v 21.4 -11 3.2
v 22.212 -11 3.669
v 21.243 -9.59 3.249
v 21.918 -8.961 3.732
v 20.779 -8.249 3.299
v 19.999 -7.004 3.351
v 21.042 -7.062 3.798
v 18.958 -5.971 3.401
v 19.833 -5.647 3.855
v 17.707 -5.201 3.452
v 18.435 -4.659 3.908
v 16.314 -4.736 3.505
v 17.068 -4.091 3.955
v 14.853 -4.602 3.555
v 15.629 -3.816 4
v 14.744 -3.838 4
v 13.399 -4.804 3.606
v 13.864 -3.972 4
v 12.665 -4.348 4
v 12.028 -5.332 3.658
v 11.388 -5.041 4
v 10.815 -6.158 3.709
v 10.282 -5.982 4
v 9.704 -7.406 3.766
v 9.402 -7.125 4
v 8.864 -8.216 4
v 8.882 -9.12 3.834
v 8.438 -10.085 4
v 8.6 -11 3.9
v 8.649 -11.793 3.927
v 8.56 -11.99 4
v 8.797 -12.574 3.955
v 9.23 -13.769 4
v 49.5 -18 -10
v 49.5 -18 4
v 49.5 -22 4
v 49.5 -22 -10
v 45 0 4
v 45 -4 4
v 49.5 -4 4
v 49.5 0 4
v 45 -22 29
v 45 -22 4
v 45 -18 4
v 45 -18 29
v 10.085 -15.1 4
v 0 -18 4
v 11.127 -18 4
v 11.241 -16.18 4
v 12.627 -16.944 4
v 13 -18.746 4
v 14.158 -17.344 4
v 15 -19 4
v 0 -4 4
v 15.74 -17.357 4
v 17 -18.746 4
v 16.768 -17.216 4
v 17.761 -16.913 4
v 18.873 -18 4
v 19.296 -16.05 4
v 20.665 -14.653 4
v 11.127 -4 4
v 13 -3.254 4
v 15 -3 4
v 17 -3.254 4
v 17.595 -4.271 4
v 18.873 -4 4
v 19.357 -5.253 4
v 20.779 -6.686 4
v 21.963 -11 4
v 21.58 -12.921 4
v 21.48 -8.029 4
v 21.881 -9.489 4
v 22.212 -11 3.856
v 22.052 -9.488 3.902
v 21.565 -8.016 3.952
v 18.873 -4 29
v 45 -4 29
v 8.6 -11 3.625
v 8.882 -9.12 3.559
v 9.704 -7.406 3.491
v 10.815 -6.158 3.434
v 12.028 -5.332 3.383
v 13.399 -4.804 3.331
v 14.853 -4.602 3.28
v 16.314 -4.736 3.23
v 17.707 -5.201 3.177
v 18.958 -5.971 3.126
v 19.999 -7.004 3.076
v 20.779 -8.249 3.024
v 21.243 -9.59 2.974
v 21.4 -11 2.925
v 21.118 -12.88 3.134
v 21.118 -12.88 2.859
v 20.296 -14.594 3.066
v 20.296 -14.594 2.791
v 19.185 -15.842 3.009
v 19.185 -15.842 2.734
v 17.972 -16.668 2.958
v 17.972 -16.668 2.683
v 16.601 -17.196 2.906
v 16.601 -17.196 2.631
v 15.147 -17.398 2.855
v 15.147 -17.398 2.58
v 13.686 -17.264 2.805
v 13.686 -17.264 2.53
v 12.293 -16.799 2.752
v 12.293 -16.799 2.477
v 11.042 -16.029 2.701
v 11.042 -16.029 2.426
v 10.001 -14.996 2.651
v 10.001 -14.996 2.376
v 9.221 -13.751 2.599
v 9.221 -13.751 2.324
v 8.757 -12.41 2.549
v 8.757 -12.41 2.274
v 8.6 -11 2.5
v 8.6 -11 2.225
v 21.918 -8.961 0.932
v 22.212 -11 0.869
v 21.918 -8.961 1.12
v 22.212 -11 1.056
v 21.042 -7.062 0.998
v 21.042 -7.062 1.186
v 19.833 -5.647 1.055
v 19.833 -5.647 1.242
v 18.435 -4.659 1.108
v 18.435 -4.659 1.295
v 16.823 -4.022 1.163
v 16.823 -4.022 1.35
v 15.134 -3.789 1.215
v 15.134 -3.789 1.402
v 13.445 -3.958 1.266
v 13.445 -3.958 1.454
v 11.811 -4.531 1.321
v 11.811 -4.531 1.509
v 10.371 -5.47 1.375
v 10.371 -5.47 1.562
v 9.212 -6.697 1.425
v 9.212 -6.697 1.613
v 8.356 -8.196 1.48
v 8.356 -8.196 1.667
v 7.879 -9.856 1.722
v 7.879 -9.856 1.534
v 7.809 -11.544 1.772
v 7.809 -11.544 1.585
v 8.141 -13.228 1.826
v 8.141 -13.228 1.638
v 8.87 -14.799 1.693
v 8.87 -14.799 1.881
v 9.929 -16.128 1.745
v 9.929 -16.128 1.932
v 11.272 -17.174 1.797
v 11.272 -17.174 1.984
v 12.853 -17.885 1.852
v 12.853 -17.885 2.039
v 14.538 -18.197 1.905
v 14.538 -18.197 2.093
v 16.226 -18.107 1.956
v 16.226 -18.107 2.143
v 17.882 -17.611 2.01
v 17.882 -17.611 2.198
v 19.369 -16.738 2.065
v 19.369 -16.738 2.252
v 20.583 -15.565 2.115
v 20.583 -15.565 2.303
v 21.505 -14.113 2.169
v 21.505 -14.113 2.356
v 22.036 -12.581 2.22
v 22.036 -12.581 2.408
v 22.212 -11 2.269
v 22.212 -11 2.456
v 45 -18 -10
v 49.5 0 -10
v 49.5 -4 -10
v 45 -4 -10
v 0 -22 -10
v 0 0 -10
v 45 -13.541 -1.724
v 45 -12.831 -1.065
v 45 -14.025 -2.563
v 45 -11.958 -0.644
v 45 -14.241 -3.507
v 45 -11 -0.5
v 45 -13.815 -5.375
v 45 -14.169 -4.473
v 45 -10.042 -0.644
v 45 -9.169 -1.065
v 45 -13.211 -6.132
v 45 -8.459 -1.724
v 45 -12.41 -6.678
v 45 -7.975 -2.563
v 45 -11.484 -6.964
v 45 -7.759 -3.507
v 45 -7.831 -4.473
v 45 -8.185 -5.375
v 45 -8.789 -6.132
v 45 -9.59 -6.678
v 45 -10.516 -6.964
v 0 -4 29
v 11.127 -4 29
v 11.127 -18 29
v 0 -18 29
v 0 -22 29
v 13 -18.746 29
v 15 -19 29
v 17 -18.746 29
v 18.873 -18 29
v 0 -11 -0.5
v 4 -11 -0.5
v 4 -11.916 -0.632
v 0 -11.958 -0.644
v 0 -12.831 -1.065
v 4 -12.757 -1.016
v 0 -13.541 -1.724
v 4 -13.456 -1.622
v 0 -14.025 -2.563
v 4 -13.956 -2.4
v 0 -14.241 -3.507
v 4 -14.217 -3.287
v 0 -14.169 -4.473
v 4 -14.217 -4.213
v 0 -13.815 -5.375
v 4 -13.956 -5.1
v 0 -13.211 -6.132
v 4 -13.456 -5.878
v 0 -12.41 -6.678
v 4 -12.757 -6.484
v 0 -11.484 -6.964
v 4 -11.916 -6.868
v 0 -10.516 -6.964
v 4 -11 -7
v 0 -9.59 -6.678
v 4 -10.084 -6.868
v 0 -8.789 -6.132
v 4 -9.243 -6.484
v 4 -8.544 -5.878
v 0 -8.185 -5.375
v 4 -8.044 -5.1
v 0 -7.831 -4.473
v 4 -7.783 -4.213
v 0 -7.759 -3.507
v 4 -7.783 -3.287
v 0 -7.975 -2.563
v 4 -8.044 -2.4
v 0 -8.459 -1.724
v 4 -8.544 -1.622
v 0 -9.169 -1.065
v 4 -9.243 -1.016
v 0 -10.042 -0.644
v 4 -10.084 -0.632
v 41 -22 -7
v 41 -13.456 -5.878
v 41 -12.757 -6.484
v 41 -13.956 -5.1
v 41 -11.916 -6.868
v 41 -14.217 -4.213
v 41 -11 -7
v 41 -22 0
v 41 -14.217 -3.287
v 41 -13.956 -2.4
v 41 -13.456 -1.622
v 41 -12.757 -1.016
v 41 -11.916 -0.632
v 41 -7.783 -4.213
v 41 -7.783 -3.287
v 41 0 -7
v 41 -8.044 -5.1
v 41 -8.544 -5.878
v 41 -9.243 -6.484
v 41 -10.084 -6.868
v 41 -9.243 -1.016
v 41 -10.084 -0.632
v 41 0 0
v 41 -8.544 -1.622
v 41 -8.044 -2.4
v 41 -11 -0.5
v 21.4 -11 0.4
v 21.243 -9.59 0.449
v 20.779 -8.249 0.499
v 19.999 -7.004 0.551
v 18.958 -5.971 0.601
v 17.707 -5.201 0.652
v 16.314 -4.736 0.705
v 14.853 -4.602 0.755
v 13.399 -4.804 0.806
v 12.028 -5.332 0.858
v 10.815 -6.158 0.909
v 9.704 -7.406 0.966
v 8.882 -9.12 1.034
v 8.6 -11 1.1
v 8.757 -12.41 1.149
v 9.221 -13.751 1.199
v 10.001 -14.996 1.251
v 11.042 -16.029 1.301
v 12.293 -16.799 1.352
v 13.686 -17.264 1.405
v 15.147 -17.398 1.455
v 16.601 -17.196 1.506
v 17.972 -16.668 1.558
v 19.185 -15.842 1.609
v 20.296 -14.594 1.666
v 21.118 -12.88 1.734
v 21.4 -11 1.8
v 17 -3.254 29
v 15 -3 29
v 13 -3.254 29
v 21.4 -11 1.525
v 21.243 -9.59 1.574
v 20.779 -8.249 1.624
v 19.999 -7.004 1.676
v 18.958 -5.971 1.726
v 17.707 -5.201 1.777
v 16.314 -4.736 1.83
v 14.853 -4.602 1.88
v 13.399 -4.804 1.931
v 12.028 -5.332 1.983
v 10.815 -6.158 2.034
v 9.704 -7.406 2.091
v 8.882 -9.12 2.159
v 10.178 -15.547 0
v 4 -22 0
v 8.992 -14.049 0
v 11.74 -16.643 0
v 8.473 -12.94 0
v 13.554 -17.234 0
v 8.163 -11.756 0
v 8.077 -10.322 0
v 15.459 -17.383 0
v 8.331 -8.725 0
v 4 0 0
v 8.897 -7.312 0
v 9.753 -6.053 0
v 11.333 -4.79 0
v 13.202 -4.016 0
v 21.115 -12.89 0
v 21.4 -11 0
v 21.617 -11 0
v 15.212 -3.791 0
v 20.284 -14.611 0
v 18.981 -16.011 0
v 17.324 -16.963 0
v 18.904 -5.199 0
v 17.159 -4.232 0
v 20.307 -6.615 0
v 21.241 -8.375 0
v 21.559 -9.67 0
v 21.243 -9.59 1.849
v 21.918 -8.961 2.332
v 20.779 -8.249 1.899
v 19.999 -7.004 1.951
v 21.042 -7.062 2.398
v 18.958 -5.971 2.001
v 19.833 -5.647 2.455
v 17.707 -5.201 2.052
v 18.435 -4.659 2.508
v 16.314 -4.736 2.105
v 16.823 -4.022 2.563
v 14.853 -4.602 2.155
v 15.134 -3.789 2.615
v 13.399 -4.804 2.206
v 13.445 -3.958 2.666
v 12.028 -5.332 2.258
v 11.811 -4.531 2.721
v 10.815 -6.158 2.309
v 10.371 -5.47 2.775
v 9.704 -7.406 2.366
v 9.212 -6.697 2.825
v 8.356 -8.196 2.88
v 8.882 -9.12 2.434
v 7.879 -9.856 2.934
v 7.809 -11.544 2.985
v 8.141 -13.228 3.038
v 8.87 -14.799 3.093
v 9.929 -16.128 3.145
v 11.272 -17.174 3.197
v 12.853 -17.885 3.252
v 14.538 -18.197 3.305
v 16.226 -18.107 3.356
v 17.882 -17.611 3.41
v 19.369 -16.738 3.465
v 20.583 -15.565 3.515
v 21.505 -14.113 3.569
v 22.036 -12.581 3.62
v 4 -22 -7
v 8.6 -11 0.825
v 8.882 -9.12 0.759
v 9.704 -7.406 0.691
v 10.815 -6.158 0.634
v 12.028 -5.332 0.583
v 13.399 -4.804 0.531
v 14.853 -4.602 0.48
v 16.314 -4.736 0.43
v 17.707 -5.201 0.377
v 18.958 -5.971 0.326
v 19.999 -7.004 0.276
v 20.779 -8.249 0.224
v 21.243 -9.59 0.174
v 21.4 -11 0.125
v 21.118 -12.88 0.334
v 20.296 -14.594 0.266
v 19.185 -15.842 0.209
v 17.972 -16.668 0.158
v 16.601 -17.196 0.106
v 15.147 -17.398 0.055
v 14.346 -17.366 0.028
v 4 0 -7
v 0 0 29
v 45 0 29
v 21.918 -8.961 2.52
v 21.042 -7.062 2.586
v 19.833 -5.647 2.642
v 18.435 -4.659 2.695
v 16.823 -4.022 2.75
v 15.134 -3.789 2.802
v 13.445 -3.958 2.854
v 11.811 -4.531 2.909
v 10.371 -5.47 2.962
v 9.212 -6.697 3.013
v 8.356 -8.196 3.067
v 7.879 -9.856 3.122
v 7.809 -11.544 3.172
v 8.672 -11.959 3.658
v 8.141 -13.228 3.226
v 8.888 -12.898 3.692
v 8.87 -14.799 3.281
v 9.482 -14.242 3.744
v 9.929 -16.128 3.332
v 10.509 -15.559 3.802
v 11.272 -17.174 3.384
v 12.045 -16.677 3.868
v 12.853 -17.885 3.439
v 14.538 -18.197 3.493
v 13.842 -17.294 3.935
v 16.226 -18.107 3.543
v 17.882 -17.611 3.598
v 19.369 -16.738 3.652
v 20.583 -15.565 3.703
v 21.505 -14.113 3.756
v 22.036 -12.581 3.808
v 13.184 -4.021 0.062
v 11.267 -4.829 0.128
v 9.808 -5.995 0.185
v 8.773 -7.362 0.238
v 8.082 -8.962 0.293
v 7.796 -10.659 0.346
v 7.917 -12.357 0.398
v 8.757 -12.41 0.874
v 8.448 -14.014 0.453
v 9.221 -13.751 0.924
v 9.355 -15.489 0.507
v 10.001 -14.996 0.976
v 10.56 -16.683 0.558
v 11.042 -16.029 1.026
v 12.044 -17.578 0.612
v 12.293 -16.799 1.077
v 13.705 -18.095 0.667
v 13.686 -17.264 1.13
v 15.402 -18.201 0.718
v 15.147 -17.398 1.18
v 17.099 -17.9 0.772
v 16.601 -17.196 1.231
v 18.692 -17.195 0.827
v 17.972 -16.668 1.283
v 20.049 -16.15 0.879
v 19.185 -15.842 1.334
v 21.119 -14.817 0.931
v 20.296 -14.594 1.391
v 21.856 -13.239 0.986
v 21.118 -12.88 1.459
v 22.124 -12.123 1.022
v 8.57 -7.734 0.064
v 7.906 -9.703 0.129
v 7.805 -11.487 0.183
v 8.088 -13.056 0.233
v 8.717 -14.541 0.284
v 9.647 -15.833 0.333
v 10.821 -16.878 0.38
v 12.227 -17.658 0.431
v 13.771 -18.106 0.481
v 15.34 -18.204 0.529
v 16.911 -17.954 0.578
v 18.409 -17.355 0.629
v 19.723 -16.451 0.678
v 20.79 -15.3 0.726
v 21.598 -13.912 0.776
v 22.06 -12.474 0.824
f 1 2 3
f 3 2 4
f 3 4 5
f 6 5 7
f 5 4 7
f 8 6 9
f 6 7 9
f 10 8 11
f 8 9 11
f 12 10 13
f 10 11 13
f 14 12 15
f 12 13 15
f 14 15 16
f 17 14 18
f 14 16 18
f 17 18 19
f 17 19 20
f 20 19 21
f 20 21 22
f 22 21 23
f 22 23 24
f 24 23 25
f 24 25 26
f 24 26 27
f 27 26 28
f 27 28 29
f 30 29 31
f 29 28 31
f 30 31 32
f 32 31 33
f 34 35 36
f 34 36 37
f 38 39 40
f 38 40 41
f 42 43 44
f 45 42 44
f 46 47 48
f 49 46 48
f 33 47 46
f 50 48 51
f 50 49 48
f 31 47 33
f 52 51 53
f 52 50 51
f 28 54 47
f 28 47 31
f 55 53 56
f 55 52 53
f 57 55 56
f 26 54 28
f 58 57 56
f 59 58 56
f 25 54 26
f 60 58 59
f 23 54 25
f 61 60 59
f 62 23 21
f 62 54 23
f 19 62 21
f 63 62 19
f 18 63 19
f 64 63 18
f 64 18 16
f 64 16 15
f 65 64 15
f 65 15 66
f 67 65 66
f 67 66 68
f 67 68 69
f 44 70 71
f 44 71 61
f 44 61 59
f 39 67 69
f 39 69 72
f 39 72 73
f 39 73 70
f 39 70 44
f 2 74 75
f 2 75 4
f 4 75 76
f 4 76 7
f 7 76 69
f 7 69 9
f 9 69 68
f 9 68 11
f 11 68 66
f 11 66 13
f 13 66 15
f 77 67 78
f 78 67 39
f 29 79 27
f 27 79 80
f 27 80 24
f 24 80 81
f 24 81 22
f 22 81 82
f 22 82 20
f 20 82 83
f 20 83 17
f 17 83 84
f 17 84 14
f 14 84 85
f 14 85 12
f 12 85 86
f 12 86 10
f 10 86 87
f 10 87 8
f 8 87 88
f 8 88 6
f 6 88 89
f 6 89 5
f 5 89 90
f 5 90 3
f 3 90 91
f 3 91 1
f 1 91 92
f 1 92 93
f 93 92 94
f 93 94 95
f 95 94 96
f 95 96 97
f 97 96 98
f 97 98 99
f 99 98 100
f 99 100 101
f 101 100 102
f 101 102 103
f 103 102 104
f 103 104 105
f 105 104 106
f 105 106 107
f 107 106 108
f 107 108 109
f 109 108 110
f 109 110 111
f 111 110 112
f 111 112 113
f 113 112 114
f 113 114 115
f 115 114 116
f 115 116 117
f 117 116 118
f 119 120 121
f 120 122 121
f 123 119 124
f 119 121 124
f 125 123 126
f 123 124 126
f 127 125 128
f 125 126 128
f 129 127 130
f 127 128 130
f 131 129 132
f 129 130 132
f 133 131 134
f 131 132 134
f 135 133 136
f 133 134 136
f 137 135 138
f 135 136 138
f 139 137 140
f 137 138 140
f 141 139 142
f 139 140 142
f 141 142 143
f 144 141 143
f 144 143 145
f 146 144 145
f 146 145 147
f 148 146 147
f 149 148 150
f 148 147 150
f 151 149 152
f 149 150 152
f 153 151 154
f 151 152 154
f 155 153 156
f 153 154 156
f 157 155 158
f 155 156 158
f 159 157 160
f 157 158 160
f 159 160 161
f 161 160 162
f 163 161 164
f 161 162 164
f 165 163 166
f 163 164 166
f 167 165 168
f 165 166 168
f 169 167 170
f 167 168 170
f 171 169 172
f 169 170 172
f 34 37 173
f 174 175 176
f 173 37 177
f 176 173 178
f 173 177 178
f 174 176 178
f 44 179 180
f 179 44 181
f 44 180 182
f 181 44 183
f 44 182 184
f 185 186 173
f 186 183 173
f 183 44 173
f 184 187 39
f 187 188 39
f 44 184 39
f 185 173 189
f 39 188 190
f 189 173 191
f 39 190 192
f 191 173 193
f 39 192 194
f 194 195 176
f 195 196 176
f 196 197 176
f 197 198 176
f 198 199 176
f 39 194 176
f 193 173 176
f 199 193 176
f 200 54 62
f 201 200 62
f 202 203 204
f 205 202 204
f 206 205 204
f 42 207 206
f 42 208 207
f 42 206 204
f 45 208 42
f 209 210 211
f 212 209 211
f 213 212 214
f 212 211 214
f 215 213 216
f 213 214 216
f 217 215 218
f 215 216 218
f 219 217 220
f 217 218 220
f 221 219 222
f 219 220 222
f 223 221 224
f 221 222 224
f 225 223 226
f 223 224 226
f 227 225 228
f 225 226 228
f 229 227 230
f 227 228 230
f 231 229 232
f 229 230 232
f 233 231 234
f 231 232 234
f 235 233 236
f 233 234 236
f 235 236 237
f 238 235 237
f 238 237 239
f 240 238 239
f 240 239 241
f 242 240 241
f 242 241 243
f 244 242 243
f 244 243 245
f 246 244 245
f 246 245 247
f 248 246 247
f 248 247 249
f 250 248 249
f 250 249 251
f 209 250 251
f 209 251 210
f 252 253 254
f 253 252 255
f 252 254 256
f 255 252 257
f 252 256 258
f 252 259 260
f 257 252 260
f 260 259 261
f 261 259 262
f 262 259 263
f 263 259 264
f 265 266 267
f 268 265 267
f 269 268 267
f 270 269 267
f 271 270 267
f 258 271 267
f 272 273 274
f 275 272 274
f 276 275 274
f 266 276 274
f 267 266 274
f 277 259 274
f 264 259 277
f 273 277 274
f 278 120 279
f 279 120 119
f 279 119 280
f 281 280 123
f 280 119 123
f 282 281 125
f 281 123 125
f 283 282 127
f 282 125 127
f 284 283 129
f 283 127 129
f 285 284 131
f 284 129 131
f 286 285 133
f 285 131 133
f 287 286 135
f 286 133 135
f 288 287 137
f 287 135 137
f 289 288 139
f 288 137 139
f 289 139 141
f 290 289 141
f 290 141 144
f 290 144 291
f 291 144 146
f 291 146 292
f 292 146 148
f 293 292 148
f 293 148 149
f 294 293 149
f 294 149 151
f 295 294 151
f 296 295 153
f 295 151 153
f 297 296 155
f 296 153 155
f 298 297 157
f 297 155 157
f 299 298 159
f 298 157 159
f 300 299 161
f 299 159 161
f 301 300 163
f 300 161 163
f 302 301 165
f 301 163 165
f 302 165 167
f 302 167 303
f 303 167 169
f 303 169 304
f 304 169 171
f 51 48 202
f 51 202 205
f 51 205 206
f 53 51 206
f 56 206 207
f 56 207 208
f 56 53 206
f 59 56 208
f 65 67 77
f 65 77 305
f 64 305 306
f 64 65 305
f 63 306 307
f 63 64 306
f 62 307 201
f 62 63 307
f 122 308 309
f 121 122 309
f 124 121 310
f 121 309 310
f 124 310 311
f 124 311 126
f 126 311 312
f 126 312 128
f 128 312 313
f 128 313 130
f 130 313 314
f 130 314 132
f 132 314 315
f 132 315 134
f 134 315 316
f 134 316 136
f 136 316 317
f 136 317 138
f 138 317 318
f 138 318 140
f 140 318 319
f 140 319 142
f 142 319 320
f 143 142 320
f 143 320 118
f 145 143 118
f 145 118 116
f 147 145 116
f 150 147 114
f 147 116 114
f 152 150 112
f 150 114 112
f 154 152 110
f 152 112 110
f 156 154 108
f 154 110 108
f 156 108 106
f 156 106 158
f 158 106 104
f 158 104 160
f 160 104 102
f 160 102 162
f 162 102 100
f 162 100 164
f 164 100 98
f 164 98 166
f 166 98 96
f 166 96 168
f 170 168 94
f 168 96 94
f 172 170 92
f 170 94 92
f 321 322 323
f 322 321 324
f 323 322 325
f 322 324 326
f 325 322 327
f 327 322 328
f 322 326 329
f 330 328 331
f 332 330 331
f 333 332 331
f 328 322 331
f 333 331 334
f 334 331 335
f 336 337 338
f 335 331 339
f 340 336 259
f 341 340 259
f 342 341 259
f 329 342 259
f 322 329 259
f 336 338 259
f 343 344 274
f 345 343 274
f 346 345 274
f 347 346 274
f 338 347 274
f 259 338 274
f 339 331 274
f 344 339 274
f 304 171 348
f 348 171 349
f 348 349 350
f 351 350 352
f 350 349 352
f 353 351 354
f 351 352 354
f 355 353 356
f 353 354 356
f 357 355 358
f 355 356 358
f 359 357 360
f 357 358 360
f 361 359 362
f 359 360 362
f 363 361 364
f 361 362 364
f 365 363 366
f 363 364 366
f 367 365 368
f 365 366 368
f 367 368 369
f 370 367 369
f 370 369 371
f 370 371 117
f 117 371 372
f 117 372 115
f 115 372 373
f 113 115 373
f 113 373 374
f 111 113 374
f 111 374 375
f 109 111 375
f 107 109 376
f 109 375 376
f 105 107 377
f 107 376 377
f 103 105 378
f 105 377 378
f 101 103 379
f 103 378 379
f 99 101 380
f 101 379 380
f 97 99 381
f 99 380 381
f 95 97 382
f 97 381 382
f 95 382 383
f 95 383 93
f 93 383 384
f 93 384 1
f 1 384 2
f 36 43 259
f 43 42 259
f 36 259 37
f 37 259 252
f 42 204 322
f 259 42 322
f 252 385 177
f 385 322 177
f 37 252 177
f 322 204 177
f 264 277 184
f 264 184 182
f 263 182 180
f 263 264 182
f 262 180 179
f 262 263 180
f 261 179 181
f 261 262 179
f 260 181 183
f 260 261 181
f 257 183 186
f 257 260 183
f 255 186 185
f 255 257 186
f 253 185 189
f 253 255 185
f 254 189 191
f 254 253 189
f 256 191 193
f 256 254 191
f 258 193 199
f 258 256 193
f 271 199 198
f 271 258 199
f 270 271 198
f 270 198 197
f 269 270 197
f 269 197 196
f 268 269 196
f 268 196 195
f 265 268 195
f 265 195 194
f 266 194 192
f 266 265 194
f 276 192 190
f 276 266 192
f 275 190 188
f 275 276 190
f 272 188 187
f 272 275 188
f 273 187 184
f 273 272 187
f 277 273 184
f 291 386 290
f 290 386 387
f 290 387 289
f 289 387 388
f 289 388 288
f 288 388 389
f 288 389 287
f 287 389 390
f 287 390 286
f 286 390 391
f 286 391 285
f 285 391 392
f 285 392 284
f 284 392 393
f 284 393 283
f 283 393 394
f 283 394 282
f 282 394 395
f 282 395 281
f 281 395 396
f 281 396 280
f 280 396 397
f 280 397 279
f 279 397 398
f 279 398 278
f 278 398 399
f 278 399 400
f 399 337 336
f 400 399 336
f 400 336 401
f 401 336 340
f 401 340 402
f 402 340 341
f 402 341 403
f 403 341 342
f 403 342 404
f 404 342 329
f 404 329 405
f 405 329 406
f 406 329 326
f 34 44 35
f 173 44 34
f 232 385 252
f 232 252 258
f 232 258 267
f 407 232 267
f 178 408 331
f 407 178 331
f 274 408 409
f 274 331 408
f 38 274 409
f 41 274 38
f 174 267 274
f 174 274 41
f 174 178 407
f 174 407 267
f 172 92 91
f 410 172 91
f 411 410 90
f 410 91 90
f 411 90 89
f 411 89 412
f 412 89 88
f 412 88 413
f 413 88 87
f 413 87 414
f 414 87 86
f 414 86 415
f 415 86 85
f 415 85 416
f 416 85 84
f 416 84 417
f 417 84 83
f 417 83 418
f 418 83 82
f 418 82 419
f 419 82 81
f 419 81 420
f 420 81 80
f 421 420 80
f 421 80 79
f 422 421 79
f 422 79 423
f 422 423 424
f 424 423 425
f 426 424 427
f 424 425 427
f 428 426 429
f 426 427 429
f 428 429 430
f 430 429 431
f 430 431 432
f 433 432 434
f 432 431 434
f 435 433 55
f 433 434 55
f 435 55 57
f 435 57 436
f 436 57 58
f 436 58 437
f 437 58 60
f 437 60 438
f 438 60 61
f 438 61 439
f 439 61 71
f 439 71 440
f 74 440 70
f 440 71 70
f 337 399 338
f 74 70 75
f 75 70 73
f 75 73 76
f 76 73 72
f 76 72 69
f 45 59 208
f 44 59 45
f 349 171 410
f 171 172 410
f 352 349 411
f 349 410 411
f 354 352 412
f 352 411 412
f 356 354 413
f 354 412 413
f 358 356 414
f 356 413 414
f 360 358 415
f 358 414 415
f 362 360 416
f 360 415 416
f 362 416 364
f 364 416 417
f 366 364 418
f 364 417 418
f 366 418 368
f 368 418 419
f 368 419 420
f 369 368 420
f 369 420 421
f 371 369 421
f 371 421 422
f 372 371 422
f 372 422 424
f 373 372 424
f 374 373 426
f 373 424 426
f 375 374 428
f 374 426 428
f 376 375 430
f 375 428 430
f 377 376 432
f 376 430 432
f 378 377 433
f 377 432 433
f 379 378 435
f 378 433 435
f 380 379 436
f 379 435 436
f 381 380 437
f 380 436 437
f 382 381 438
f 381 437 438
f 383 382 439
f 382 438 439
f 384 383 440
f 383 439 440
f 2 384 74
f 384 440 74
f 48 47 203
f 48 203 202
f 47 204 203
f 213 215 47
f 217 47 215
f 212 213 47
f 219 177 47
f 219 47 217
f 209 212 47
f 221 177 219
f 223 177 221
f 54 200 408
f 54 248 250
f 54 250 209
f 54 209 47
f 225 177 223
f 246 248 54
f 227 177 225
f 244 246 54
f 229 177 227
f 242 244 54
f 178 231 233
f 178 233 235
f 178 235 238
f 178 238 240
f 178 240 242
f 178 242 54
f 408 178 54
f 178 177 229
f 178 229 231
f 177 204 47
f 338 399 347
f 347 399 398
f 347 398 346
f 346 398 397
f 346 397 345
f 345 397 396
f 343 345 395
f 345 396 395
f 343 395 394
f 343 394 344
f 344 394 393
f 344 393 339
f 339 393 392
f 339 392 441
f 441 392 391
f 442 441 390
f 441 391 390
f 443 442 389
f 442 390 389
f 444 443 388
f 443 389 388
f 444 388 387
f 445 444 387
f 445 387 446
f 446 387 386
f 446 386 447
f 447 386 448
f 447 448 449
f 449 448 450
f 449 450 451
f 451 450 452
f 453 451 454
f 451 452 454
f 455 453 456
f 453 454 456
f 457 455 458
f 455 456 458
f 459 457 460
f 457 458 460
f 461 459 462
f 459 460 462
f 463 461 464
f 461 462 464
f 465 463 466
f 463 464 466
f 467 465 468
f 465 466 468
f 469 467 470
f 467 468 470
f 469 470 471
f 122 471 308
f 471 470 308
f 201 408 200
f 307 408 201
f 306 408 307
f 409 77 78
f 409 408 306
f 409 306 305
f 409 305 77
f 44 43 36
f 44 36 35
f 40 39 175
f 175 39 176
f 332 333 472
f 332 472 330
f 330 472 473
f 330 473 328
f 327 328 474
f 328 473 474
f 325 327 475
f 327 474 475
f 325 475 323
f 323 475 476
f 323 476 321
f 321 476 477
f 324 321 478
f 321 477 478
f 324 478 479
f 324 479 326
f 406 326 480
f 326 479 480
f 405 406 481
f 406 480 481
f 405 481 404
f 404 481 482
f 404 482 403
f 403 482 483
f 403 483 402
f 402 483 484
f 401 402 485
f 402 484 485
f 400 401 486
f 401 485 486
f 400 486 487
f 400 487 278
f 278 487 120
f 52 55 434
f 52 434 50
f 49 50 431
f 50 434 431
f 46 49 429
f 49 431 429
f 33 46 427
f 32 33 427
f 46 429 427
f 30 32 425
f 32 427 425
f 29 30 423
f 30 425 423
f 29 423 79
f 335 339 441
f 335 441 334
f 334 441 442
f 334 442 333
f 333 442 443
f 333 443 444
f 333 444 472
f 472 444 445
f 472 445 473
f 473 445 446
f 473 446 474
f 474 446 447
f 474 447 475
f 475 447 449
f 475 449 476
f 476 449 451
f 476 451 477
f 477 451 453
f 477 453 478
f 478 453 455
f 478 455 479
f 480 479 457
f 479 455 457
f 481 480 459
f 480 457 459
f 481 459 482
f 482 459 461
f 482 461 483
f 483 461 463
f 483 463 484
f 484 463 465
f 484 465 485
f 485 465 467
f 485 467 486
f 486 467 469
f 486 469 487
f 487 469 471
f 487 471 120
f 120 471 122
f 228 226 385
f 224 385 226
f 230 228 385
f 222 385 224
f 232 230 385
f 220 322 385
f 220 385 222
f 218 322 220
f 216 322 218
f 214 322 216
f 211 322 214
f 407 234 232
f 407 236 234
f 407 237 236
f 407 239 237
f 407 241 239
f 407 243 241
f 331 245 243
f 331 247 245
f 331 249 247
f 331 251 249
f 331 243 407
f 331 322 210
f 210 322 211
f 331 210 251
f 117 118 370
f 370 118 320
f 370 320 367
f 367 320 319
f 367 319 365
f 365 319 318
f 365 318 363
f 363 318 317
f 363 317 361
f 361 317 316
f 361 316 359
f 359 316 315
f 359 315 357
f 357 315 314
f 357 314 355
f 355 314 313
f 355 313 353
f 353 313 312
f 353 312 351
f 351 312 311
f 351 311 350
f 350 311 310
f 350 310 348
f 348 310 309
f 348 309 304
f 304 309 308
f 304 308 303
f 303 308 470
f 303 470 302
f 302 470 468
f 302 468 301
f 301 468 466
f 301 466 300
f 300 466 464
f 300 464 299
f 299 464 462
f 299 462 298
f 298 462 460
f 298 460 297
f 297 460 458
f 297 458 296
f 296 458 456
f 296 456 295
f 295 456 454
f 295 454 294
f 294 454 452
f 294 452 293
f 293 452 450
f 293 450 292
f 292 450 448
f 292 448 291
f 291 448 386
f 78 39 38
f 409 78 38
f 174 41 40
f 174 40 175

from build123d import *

# Parameters (mm, degrees)
ESQUISSE1_W                         = 45
ESQUISSE1_H                         = 22
BOSS_EXTRU_1_DEPTH                  = 4
ESQUISSE2_R                         = 6.4
ENL_V_MAT_EXTRU_1_DEPTH             = 4
FILETAGE1_PITCH                     = 1.4
ESQUISSE3_W                         = 4
ESQUISSE3_H                         = 22
BOSS_EXTRU_2_DEPTH                  = 10
ESQUISSE4_W                         = 3
ESQUISSE4_H                         = 22
BOSS_EXTRU_3_DEPTH                  = 37
ENL_V_MAT_EXTRU_2_REACH             = 49.592
ESQUISSE5_R                         = 3.25
ENL_V_MAT_EXTRU_2_DIRECTION_2_REACH = 49.592
ESQUISSE6_W                         = 45
ESQUISSE6_H                         = 4
BOSS_EXTRU_4_DEPTH                  = 25
ESQUISSE7_R                         = 8
ENL_V_MAT_EXTRU_4_DEPTH             = 25
ESQUISSE8_W                         = 14
ESQUISSE8_H                         = 4
BOSS_EXTRU_5_DEPTH                  = 4.5


with BuildPart() as part:
    # Esquisse1 → Boss.-Extru.1 (new body)
    with BuildSketch(Plane.XY):
        with Locations((22.5, -11)):
            Rectangle(ESQUISSE1_W, ESQUISSE1_H)
    extrude(amount=BOSS_EXTRU_1_DEPTH)

    # Esquisse2 → Enlèv. mat.-Extru.1 (cut)
    with BuildSketch(Plane(origin=(0, 0, 0), x_dir=(-1, 0, 0), z_dir=(0, 0, -1))):
        with Locations((-15, -11)):
            Circle(ESQUISSE2_R)
    extrude(amount=-ENL_V_MAT_EXTRU_1_DEPTH, mode=Mode.SUBTRACT)

    # Filetage1: the profile of Profil de filetage1 profile screwed along a right-hand helix of 4 turns, 8 arcs to a turn; built about Z, then put on its axis
    filetage1_z = Axis((0, 0, 0), (0, 0, 1))
    filetage1_corners = [(6.3997, 0, -0.000173205), (7.211898812, 0, 0.468749998), (7.211898812, 0, 0.656249998), (6.3997, 0, 1.125173201)]
    with BuildLine(mode=Mode.PRIVATE) as filetage1_profile:
        Line(filetage1_corners[0], filetage1_corners[1])
        Line(filetage1_corners[1], filetage1_corners[2])
        Line(filetage1_corners[2], filetage1_corners[3])
        Line(filetage1_corners[3], filetage1_corners[0])
    filetage1_cap = Face(filetage1_profile.wire())
    filetage1_turn_angles = [0, 22.5, 45, 67.5, 90, 112.5, 135, 157.5, 180, 202.5, 225, 247.5, 270, 292.5, 315, 337.5, 360]
    filetage1_turn_weights = [1, 0.9238795325112867, 1, 0.9238795325112867, 1, 0.9238795325112867, 1, 0.9238795325112867, 1, 0.9238795325112867, 1, 0.9238795325112867, 1, 0.9238795325112867, 1, 0.9238795325112867, 1]
    filetage1_turn_rails = [Edge.make_bspline([Vector(p[0], p[1], 0).rotate(filetage1_z, filetage1_turn_angles[k]) / filetage1_turn_weights[k] + Vector(0, 0, p[2] + FILETAGE1_PITCH * filetage1_turn_angles[k] / 360) for k in range(17)], [0, 0, 0, 1, 1, 2, 2, 3, 3, 4, 4, 5, 5, 6, 6, 7, 7, 8, 8, 8], 2, filetage1_turn_weights) for p in filetage1_corners]
    filetage1_turn_sides = [Face.make_surface_from_curves(filetage1_turn_rails[p[0]], filetage1_turn_rails[p[1]]) for p in [(0, 1), (1, 2), (2, 3), (3, 0)]]
    filetage1 = Plane(origin=(15, -11, -1), x_dir=(1, 0, 0), z_dir=(0, 0, 1)) * Solid(Shell([*[p.moved(Location((0, 0, FILETAGE1_PITCH * i))) for i in range(4) for p in filetage1_turn_sides], filetage1_cap, filetage1_cap.rotate(filetage1_z, 1440).moved(Location((0, 0, FILETAGE1_PITCH * 1440 / 360)))]))
    add(filetage1, mode=Mode.SUBTRACT)

    # Esquisse3 → Boss.-Extru.2 (add)
    with BuildSketch(Plane(origin=(0, 0, 0), x_dir=(-1, 0, 0), z_dir=(0, 0, -1))):
        with Locations((-43, -11)):
            Rectangle(ESQUISSE3_W, ESQUISSE3_H)
        with Locations((-2, -11)):
            Rectangle(ESQUISSE3_W, ESQUISSE3_H)
    extrude(amount=BOSS_EXTRU_2_DEPTH)

    # Esquisse4 → Boss.-Extru.3 (add)
    with BuildSketch(Plane(origin=(4, 0, 0), x_dir=(0, 0, -1), z_dir=(1, 0, 0))):
        with Locations((8.5, -11)):
            Rectangle(ESQUISSE4_W, ESQUISSE4_H)
    extrude(amount=BOSS_EXTRU_3_DEPTH)

    # Enlèv. mat.-Extru.2: up to this face of the body (flat: up to its plane)
    enl_v_mat_extru_2_end = Plane(part.part.faces().sort_by_distance((0, -11, -3))[0])
    # Esquisse5 → Enlèv. mat.-Extru.2 (cut, up to the picked face)
    with BuildSketch(Plane(origin=(4, 0, 0), x_dir=(0, 0, -1), z_dir=(1, 0, 0)), mode=Mode.PRIVATE) as enl_v_mat_extru_2_sk1:
        with Locations(Location((3.75, -11, 0), (0, 0, 180))):
            Circle(ESQUISSE5_R)
    enl_v_mat_extru_2_tool1 = split(extrude(enl_v_mat_extru_2_sk1.sketch, amount=-ENL_V_MAT_EXTRU_2_REACH, mode=Mode.PRIVATE), bisect_by=enl_v_mat_extru_2_end, keep=Keep.BOTH, mode=Mode.PRIVATE)
    add(enl_v_mat_extru_2_tool1.solids().sort_by(Axis((4, -11, -3.75), (-1, 0, 0)))[0], mode=Mode.SUBTRACT)

    # Enlèv. mat.-Extru.2 direction 2: up to this face of the body (flat: up to its plane)
    enl_v_mat_extru_2_direction_2_end = Plane(part.part.faces().sort_by_distance((45, -11, -3))[0])
    # Esquisse5 → Enlèv. mat.-Extru.2 direction 2 (cut, up to the picked face)
    with BuildSketch(Plane(origin=(4, 0, 0), x_dir=(0, 0, -1), z_dir=(1, 0, 0)), mode=Mode.PRIVATE) as enl_v_mat_extru_2_direction_2_sk1:
        with Locations(Location((3.75, -11, 0), (0, 0, 180))):
            Circle(ESQUISSE5_R)
    enl_v_mat_extru_2_direction_2_tool1 = split(extrude(enl_v_mat_extru_2_direction_2_sk1.sketch, amount=ENL_V_MAT_EXTRU_2_DIRECTION_2_REACH, mode=Mode.PRIVATE), bisect_by=enl_v_mat_extru_2_direction_2_end, keep=Keep.BOTH, mode=Mode.PRIVATE)
    add(enl_v_mat_extru_2_direction_2_tool1.solids().sort_by(Axis((4, -11, -3.75), (1, 0, 0)))[0], mode=Mode.SUBTRACT)

    # Esquisse6 → Boss.-Extru.4 (add)
    with BuildSketch(Plane.XY.offset(4)):
        with Locations((22.5, -2)):
            Rectangle(ESQUISSE6_W, ESQUISSE6_H)
        with Locations((22.5, -20)):
            Rectangle(ESQUISSE6_W, ESQUISSE6_H)
    extrude(amount=BOSS_EXTRU_4_DEPTH)

    # Esquisse7 → Enlèv. mat.-Extru.4 (cut)
    with BuildSketch(Plane.XY.offset(4)):
        with Locations((15, -11)):
            Circle(ESQUISSE7_R)
    extrude(amount=ENL_V_MAT_EXTRU_4_DEPTH, mode=Mode.SUBTRACT)

    # Esquisse8 → Boss.-Extru.5 (add)
    with BuildSketch(Plane(origin=(45, 0, 0), x_dir=(0, 0, -1), z_dir=(1, 0, 0))):
        with Locations((3, -20)):
            Rectangle(ESQUISSE8_W, ESQUISSE8_H)
        with Locations((3, -2)):
            Rectangle(ESQUISSE8_W, ESQUISSE8_H)
    extrude(amount=BOSS_EXTRU_5_DEPTH)


solid = part.part
